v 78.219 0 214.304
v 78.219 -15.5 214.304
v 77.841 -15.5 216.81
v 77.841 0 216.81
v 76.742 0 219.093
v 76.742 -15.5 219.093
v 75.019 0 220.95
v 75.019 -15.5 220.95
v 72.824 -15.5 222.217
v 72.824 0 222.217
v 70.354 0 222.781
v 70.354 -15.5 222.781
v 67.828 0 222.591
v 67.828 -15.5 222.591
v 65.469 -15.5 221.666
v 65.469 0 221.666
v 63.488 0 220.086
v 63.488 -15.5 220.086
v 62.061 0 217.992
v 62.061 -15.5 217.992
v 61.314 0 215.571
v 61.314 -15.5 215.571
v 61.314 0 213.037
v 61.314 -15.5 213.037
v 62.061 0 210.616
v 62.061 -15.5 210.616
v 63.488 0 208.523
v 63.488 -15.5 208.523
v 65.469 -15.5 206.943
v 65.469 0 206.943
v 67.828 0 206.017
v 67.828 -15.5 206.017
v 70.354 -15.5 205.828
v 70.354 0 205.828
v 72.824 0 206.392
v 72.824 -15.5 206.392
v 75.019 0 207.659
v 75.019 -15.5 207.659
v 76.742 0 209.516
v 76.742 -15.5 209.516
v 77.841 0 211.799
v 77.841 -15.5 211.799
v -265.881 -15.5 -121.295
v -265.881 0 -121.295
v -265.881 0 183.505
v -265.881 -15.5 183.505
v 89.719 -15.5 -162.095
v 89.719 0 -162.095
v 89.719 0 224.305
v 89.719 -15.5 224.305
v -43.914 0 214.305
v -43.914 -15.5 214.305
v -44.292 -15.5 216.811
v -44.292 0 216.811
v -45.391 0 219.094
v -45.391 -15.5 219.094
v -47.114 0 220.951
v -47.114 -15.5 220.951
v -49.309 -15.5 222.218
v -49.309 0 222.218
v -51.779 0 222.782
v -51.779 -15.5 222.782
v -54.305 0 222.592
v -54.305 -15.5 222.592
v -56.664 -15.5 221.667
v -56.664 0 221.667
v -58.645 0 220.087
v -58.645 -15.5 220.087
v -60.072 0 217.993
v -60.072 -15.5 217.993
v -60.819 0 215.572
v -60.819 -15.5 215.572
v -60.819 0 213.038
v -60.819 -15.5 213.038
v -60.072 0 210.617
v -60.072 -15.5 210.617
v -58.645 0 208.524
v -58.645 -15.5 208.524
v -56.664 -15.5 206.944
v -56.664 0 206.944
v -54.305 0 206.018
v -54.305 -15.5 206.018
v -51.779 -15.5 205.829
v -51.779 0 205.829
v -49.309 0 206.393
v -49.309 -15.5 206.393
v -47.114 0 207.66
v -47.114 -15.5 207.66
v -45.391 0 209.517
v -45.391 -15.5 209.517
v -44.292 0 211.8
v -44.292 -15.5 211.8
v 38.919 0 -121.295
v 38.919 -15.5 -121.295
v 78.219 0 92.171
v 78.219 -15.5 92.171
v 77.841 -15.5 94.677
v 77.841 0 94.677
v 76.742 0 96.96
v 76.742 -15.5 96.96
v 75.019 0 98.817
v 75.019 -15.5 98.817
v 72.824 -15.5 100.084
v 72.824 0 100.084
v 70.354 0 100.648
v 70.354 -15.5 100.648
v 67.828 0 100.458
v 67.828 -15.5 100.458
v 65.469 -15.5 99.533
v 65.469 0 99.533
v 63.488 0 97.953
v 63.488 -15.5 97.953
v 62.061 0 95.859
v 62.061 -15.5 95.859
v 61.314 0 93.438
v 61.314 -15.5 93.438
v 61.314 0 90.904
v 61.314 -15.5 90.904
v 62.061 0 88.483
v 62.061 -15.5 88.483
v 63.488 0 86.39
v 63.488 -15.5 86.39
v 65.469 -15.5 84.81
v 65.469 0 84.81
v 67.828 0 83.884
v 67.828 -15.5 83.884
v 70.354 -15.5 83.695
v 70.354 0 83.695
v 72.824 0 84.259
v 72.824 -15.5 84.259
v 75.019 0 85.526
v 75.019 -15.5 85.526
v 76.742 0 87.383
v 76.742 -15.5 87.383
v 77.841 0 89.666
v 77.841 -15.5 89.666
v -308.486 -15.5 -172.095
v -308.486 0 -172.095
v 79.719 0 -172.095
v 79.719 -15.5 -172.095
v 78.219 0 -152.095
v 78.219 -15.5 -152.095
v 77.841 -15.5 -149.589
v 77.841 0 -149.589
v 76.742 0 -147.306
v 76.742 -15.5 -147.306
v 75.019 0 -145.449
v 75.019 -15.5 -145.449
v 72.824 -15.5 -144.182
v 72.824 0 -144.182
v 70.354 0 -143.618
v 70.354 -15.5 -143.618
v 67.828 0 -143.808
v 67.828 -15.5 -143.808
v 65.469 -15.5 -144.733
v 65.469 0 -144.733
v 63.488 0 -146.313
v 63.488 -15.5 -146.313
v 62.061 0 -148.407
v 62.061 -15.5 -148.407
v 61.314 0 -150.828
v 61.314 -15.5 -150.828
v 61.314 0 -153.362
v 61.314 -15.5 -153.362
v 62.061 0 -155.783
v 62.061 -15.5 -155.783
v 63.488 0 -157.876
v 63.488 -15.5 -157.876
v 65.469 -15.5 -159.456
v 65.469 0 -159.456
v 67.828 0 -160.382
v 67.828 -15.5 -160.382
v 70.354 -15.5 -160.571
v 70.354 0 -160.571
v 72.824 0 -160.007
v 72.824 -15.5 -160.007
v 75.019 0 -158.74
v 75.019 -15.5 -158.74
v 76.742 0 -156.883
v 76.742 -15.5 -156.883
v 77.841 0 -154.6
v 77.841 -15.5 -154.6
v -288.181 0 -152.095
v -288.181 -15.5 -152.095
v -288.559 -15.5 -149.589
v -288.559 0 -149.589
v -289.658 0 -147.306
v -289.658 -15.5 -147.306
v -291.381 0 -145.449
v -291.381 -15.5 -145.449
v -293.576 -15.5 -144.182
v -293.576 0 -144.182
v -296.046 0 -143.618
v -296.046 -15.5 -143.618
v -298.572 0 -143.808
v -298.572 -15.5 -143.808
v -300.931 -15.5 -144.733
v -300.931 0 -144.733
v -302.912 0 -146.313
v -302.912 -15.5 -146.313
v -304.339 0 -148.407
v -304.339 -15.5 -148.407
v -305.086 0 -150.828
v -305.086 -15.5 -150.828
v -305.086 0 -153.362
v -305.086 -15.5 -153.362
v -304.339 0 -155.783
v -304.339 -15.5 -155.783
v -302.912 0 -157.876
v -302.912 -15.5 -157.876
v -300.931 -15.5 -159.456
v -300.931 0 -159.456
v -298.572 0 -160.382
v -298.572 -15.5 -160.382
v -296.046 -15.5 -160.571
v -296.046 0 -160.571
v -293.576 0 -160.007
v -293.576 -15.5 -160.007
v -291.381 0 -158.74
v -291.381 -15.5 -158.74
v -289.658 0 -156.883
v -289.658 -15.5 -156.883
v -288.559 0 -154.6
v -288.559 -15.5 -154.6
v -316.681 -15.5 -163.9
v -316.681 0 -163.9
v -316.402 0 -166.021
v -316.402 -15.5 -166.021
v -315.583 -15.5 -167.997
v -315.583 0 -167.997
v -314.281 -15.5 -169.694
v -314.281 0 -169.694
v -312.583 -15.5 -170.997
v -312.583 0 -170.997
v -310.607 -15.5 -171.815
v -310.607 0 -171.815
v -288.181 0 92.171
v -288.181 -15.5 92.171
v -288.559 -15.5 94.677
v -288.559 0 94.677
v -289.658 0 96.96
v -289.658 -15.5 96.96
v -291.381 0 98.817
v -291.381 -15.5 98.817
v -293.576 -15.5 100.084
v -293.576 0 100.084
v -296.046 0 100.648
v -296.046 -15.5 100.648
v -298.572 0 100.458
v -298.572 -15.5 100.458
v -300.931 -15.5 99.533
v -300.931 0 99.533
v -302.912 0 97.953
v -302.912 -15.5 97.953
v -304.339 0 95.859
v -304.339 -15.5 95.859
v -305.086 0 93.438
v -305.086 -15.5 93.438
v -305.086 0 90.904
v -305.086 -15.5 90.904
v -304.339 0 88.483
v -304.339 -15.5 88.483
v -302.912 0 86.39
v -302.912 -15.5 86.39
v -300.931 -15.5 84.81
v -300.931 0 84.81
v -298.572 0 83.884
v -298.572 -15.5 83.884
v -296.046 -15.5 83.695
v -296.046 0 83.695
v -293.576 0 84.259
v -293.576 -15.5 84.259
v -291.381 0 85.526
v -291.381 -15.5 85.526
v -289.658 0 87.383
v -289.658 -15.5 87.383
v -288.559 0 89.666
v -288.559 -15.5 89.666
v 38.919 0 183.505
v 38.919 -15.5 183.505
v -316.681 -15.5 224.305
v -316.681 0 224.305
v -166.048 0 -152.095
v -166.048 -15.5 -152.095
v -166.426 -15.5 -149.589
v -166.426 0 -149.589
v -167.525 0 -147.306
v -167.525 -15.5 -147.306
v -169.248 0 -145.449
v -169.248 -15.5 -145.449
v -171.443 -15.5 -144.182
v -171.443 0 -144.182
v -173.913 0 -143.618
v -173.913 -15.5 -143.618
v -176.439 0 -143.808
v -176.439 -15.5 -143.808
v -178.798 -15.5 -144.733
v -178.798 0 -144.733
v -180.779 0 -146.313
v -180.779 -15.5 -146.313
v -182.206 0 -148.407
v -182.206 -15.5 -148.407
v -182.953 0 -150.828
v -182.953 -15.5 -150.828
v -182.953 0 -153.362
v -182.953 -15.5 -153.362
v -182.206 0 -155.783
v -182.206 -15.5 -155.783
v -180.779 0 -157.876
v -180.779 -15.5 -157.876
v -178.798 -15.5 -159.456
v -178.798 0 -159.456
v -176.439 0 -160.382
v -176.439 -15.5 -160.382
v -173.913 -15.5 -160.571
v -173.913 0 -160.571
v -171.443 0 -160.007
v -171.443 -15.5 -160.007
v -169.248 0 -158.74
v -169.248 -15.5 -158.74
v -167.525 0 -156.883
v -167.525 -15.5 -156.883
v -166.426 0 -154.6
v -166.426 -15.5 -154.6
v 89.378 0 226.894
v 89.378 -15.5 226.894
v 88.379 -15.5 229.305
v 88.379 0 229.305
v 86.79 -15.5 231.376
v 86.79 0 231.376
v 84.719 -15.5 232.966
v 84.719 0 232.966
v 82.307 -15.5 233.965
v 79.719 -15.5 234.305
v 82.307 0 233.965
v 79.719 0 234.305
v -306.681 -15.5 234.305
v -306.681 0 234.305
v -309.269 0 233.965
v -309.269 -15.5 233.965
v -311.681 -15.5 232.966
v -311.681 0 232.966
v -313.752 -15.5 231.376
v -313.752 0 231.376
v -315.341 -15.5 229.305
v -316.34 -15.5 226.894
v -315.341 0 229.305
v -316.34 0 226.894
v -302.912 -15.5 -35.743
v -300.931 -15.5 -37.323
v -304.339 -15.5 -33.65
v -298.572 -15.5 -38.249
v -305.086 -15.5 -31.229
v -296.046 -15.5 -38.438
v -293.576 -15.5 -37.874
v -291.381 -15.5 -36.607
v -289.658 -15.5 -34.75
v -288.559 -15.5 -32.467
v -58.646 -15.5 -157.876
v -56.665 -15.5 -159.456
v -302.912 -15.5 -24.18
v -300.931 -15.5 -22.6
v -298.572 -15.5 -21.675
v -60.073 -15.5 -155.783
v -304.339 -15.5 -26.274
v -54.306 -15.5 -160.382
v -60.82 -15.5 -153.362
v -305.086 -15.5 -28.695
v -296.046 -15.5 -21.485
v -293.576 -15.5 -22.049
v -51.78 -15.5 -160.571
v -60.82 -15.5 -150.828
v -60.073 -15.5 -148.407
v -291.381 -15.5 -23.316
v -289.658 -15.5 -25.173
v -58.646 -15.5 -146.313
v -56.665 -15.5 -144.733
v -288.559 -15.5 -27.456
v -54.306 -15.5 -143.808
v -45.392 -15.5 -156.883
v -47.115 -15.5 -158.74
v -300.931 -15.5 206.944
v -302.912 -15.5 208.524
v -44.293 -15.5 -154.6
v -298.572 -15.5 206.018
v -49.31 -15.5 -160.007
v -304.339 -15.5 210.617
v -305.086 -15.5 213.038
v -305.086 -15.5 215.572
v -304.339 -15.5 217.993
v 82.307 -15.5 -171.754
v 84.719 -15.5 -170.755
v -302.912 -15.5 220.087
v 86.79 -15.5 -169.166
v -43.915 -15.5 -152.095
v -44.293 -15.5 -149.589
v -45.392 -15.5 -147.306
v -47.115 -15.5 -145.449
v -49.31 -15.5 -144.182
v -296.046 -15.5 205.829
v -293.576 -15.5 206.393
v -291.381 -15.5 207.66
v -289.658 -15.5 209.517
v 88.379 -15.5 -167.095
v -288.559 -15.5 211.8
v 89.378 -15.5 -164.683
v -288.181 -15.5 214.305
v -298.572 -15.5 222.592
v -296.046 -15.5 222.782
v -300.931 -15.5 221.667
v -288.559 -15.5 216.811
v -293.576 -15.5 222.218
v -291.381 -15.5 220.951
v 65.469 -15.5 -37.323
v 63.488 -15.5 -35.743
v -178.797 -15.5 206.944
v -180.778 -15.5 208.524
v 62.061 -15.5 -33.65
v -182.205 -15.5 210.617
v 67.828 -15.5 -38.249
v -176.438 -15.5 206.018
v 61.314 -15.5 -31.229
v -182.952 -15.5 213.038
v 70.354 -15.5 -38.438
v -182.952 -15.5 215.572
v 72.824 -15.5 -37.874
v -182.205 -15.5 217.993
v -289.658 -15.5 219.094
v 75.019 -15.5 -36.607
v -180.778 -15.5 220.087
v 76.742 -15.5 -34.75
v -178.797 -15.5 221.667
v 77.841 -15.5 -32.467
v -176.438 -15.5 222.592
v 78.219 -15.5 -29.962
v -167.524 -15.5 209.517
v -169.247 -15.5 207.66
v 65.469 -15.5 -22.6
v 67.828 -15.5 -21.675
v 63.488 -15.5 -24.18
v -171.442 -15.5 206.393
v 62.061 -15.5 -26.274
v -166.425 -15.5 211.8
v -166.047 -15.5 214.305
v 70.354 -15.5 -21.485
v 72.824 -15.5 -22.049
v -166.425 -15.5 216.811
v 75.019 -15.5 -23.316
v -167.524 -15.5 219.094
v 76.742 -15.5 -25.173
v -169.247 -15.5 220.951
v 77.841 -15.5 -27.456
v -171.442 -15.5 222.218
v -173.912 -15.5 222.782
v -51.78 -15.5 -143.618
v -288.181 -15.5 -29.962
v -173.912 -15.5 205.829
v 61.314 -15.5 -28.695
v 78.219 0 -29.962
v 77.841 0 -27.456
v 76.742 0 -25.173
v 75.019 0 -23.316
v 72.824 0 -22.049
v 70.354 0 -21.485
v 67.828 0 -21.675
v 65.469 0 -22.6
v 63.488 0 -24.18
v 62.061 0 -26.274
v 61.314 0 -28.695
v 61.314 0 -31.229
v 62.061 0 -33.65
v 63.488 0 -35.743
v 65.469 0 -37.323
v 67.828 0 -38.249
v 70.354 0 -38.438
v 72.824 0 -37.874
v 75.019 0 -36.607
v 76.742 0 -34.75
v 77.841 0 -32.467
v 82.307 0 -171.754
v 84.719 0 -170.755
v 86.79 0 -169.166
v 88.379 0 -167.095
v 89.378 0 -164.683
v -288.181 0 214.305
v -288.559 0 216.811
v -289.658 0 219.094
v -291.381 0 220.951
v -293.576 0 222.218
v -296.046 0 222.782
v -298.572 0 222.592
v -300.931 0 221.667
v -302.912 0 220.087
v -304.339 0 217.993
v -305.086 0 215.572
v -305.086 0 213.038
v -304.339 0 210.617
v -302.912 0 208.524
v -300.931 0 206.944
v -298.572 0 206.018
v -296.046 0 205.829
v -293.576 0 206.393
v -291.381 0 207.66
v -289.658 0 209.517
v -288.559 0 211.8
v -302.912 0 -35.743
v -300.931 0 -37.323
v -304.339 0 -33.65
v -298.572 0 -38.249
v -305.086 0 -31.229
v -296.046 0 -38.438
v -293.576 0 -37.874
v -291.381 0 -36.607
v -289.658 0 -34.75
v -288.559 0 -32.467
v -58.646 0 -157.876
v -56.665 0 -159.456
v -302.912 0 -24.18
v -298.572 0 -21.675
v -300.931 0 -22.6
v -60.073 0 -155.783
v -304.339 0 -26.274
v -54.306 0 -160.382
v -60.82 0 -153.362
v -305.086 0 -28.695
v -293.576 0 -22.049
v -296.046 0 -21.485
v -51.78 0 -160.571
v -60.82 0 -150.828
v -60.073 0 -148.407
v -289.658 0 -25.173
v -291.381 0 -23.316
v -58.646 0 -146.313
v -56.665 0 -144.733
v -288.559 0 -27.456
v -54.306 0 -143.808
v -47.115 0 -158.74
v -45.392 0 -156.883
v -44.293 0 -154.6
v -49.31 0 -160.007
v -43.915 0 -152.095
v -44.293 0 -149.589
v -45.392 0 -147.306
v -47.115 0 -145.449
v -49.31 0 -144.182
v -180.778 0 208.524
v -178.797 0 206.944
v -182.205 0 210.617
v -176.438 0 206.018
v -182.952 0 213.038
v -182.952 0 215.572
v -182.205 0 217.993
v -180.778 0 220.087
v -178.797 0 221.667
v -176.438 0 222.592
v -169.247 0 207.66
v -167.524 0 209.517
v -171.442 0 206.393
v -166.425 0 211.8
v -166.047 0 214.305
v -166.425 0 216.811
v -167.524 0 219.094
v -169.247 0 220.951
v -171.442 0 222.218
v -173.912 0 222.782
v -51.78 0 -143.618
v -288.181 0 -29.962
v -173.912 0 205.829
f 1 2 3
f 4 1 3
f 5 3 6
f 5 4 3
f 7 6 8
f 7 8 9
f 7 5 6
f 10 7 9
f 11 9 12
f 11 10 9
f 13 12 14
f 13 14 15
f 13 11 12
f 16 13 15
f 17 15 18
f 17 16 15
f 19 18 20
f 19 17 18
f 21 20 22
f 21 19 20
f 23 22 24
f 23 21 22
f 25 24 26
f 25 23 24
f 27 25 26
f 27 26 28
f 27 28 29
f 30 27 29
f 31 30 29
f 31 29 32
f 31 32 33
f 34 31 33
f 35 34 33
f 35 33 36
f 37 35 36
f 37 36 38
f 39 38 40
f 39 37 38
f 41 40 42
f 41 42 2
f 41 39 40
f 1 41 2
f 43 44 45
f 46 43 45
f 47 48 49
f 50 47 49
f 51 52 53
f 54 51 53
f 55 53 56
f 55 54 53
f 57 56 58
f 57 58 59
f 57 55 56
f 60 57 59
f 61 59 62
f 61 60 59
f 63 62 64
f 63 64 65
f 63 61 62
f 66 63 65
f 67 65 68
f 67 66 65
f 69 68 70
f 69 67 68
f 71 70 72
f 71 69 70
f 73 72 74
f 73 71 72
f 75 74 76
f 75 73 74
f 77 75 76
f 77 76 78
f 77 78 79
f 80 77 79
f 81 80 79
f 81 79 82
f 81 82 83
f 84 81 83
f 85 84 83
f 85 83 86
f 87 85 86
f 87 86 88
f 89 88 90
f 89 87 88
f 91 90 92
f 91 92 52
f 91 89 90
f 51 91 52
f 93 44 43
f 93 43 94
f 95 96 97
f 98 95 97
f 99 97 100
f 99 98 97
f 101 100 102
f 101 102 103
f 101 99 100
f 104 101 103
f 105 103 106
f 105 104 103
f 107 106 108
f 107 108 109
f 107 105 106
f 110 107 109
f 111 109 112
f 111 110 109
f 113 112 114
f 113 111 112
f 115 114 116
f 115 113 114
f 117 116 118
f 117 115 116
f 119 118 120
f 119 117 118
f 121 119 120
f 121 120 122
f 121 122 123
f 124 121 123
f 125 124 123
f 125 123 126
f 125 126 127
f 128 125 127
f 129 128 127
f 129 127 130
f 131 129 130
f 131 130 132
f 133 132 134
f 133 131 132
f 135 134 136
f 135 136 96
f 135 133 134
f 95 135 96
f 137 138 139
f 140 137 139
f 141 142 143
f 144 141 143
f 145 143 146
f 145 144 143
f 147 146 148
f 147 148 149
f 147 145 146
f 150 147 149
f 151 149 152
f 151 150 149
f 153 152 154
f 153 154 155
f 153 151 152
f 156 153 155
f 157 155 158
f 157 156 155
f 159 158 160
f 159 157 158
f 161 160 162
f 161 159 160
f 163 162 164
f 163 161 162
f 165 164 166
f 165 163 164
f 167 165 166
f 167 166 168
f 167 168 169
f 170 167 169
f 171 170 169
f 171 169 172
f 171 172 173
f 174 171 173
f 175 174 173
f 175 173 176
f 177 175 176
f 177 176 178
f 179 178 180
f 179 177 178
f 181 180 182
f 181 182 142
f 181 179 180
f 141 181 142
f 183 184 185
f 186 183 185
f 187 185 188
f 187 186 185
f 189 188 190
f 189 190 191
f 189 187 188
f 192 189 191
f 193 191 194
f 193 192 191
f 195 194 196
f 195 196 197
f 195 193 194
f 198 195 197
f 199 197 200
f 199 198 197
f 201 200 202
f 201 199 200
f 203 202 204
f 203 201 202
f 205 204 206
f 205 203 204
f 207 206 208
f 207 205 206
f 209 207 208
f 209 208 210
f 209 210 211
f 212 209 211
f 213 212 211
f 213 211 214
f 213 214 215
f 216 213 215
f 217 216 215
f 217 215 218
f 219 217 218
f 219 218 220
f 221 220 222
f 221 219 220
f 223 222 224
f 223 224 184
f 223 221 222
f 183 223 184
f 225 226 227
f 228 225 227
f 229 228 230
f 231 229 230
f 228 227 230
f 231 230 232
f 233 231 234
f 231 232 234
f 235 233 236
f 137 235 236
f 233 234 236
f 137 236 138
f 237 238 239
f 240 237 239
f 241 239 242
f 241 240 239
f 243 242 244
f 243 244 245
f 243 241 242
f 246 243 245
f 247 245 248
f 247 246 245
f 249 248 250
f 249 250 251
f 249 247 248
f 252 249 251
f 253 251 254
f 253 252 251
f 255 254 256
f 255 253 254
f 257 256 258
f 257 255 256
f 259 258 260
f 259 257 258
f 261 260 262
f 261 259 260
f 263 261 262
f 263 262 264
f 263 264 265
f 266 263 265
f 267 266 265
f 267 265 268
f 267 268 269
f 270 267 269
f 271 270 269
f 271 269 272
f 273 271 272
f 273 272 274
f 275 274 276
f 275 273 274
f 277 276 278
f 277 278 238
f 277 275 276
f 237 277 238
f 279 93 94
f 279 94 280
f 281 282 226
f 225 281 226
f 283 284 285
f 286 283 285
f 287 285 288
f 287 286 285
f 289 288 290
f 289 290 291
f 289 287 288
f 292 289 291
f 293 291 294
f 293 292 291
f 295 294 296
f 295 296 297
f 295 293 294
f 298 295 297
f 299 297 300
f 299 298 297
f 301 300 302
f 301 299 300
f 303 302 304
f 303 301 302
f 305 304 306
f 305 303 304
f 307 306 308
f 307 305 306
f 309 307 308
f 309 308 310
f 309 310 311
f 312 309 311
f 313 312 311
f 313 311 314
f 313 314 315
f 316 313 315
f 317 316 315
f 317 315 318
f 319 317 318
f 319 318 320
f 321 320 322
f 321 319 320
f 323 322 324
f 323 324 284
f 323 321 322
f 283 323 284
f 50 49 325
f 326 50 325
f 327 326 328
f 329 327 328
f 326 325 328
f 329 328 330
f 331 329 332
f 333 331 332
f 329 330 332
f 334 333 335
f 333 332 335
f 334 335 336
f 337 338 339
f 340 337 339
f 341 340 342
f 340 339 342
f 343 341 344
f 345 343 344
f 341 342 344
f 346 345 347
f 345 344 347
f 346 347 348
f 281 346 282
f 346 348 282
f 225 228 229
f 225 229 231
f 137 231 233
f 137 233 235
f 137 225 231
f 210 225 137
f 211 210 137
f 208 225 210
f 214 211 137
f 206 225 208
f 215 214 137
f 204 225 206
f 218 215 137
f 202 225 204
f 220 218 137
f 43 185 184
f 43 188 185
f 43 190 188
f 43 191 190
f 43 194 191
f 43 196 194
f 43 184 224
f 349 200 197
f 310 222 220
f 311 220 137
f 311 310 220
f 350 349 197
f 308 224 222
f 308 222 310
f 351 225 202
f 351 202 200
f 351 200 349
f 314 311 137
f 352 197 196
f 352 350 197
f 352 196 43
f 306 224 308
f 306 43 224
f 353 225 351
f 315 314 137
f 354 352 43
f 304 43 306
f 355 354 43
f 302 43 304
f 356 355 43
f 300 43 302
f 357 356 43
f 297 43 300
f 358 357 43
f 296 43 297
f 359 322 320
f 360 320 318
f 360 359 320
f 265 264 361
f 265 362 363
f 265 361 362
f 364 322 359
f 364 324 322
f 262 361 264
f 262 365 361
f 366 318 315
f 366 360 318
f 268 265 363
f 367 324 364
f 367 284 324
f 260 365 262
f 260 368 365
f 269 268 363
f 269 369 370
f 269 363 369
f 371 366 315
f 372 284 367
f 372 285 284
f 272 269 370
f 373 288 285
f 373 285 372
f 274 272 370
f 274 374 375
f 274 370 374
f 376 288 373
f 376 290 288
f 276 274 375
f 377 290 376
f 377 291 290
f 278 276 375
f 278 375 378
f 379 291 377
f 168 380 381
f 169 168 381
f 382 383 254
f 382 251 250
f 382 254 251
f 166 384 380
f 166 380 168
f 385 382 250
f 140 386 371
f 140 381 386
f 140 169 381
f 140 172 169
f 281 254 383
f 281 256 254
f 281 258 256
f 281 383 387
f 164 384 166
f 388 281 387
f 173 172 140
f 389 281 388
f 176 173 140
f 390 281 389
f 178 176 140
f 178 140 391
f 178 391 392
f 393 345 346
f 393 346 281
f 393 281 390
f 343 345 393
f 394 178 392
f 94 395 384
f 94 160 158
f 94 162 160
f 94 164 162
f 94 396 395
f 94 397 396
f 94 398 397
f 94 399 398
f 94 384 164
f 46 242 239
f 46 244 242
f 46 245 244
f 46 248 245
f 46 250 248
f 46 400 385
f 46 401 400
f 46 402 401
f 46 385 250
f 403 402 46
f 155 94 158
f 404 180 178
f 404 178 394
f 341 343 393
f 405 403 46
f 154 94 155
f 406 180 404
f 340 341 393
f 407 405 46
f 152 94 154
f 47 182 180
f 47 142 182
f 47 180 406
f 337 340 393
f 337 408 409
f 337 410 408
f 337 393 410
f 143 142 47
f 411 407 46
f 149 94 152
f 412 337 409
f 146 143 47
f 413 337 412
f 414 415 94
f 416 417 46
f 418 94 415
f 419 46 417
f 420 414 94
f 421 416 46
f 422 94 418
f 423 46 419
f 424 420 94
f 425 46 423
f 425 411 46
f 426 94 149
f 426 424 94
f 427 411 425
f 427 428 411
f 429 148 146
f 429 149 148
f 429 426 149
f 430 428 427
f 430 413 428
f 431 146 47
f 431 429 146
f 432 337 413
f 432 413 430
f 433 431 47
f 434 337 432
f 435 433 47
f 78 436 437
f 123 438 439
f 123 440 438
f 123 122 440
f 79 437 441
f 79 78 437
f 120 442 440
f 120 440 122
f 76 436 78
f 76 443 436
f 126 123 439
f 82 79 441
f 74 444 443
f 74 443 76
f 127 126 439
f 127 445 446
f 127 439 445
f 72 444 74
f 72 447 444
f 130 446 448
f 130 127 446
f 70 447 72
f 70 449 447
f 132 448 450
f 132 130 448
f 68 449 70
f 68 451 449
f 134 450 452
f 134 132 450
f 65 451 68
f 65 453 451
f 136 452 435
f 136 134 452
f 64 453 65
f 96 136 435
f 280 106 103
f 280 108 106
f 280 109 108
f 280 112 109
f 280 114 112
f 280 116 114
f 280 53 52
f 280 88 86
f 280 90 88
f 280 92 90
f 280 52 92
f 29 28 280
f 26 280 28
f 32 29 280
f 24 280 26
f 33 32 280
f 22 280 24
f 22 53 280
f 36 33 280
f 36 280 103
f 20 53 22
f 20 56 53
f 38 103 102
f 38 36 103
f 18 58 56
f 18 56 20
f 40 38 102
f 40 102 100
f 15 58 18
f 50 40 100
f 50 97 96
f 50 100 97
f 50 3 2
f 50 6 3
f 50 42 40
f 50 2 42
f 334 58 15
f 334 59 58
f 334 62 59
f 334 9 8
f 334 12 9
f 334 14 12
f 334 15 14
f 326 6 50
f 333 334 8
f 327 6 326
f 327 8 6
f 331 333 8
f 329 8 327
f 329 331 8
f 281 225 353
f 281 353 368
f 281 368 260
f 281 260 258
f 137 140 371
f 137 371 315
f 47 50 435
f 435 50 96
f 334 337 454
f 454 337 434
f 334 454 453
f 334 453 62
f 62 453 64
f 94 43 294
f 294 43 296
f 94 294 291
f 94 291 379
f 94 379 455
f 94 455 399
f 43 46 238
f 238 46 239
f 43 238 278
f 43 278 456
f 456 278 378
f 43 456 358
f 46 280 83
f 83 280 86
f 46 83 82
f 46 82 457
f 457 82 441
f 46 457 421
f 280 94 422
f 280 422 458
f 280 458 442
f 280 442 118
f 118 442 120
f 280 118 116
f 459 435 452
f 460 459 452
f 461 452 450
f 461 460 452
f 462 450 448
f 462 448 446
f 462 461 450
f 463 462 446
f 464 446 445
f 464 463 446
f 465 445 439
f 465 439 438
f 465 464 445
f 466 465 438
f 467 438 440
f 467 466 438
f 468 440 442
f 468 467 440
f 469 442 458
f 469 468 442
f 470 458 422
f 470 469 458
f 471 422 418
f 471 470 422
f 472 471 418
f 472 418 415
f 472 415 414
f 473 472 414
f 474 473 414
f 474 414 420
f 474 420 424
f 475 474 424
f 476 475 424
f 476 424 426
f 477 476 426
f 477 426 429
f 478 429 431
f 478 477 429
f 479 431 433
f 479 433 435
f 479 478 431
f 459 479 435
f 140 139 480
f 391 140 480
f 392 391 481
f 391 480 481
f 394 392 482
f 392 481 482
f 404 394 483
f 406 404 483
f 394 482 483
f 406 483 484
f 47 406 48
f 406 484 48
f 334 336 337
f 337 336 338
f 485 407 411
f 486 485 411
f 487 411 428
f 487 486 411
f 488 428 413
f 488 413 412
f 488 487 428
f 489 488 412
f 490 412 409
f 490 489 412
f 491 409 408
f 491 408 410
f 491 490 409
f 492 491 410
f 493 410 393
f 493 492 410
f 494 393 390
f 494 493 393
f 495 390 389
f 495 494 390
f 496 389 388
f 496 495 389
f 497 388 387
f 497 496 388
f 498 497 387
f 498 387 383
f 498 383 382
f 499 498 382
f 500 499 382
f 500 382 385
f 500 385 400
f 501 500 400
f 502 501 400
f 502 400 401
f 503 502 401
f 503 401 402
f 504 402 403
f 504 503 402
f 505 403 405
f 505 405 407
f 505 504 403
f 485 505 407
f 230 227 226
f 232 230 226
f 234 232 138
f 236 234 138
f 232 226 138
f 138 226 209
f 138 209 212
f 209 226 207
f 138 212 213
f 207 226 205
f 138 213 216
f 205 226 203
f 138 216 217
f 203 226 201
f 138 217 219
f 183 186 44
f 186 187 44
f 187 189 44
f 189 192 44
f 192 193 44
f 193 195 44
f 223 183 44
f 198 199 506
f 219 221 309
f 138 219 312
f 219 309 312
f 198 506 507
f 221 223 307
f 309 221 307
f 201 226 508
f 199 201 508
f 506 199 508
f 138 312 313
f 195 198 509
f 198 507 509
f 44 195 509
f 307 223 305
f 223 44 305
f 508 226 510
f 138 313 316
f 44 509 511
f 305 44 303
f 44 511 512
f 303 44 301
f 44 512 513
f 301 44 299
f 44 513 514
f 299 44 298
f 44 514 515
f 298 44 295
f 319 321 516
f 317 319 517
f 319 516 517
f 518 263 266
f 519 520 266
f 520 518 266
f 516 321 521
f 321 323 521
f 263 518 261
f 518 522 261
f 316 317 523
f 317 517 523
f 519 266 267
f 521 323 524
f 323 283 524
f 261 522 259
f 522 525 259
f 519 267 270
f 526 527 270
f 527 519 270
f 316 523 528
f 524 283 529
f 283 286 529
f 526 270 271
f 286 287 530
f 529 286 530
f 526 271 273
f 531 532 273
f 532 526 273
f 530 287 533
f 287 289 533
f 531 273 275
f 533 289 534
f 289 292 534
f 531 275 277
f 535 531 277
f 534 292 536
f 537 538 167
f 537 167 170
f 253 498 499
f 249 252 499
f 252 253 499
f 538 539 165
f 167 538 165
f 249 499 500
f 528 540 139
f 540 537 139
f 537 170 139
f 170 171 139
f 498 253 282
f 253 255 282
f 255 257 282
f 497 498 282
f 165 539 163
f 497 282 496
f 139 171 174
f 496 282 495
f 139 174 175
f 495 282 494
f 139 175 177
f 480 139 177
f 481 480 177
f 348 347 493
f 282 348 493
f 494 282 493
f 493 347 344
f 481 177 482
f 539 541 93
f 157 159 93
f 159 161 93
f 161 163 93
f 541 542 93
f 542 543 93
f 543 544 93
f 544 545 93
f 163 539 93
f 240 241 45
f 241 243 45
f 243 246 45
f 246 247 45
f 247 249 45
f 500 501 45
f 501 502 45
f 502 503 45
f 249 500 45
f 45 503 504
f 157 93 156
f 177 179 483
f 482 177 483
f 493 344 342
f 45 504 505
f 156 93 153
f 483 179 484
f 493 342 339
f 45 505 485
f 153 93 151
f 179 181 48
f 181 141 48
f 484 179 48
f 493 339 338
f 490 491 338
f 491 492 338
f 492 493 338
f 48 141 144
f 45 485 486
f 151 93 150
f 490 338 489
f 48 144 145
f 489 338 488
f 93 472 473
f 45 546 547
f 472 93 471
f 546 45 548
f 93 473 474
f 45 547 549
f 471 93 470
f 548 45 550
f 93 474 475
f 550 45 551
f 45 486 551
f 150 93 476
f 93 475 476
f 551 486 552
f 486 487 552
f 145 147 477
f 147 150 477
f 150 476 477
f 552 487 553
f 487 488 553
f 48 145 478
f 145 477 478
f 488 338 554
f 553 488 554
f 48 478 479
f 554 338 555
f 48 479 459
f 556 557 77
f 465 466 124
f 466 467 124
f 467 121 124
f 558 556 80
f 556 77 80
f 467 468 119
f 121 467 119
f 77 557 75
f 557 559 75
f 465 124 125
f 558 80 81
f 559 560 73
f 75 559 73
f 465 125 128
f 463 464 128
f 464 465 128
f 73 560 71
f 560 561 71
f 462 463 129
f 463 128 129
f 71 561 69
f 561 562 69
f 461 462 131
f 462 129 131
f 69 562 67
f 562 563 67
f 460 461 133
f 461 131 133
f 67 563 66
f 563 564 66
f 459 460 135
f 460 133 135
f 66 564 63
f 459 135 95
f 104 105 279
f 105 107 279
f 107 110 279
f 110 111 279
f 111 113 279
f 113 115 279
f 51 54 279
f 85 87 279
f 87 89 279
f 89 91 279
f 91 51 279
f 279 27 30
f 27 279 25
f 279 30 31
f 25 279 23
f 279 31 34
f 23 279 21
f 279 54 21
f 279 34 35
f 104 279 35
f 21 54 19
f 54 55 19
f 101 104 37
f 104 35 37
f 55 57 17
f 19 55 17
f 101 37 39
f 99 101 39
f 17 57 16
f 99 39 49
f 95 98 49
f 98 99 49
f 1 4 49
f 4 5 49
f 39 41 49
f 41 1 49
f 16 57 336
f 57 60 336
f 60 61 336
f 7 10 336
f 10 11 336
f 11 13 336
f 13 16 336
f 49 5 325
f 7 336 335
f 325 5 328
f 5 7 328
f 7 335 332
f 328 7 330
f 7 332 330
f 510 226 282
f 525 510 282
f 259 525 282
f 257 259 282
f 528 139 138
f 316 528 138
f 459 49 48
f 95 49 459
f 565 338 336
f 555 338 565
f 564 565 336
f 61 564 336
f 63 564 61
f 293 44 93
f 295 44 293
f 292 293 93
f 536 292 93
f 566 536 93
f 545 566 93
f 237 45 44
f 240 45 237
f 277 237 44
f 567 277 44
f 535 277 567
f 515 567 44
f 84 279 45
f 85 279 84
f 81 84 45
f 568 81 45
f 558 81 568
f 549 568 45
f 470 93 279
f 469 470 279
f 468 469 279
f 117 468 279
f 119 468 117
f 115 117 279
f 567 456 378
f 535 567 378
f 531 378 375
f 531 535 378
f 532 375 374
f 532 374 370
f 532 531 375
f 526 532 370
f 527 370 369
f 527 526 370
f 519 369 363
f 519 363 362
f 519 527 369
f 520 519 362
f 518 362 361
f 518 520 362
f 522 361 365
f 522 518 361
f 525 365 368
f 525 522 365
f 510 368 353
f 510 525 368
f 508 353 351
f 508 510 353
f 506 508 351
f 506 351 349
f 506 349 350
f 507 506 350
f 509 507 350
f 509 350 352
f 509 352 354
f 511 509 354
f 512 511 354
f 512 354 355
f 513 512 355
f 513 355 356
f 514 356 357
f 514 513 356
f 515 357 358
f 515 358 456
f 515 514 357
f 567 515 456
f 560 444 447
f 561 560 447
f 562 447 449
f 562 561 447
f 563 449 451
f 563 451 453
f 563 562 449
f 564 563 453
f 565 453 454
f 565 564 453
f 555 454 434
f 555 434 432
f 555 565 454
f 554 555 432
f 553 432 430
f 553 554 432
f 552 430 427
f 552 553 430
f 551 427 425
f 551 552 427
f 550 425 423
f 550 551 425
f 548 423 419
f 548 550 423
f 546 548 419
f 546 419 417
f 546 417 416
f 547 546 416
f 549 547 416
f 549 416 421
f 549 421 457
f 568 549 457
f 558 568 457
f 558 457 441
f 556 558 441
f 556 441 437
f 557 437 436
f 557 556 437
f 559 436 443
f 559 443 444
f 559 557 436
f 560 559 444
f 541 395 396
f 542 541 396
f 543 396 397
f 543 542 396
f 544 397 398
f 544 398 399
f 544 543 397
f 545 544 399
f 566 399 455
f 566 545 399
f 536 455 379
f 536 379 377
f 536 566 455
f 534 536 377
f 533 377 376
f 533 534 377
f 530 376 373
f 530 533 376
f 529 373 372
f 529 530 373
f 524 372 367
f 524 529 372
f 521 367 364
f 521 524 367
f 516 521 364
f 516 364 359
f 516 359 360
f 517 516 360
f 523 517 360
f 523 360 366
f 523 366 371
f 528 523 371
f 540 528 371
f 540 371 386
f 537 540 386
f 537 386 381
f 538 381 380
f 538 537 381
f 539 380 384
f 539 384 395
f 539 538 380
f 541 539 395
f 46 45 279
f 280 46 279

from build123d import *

# Parameters (mm, degrees)
F0_R     = 8.5
F0_W     = 304.8
F0_H     = 304.8
F1_DEPTH = 15.5


with BuildPart() as f1:
    # F0 (on Front) → F1 (new body)
    with BuildSketch(Plane.XZ):
        with BuildLine():
            ThreePointArc((-306.680941, 234.30534), (-313.752009, 231.376408), (-316.680941, 224.30534))
            Line((-316.680941, 224.30534), (-316.680941, -163.899746))
            ThreePointArc((-316.680941, -163.899746), (-314.280706, -169.694425), (-308.486027, -172.09466))
            Line((-308.486027, -172.09466), (79.719059, -172.09466))
            ThreePointArc((79.719059, -172.09466), (86.790127, -169.165728), (89.719059, -162.09466))
            Line((89.719059, -162.09466), (89.719059, 224.30534))
            ThreePointArc((89.719059, 224.30534), (86.790127, 231.376408), (79.719059, 234.30534))
            Line((79.719059, 234.30534), (-306.680941, 234.30534))
        make_face()
        with Locations((-296.680941, -152.09466)):
            Circle(F0_R, mode=Mode.SUBTRACT)
        with Locations((-174.547941, -152.09466)):
            Circle(F0_R, mode=Mode.SUBTRACT)
        with Locations((-296.680941, -29.96166)):
            Circle(F0_R, mode=Mode.SUBTRACT)
        with Locations((-52.414941, -152.09466)):
            Circle(F0_R, mode=Mode.SUBTRACT)
        with Locations((69.719059, -152.09466)):
            Circle(F0_R, mode=Mode.SUBTRACT)
        with Locations((-113.480941, 31.10534)):
            Rectangle(F0_W, F0_H, mode=Mode.SUBTRACT)
        with Locations((69.719059, -29.96166)):
            Circle(F0_R, mode=Mode.SUBTRACT)
        with Locations((-296.680941, 92.17134)):
            Circle(F0_R, mode=Mode.SUBTRACT)
        with Locations((-296.680941, 214.30534)):
            Circle(F0_R, mode=Mode.SUBTRACT)
        with Locations((-174.546941, 214.30534)):
            Circle(F0_R, mode=Mode.SUBTRACT)
        with Locations((69.719059, 92.17134)):
            Circle(F0_R, mode=Mode.SUBTRACT)
        with Locations((-52.413941, 214.30534)):
            Circle(F0_R, mode=Mode.SUBTRACT)
        with Locations((69.719059, 214.30434)):
            Circle(F0_R, mode=Mode.SUBTRACT)
    extrude(amount=F1_DEPTH)


solid = f1.part
